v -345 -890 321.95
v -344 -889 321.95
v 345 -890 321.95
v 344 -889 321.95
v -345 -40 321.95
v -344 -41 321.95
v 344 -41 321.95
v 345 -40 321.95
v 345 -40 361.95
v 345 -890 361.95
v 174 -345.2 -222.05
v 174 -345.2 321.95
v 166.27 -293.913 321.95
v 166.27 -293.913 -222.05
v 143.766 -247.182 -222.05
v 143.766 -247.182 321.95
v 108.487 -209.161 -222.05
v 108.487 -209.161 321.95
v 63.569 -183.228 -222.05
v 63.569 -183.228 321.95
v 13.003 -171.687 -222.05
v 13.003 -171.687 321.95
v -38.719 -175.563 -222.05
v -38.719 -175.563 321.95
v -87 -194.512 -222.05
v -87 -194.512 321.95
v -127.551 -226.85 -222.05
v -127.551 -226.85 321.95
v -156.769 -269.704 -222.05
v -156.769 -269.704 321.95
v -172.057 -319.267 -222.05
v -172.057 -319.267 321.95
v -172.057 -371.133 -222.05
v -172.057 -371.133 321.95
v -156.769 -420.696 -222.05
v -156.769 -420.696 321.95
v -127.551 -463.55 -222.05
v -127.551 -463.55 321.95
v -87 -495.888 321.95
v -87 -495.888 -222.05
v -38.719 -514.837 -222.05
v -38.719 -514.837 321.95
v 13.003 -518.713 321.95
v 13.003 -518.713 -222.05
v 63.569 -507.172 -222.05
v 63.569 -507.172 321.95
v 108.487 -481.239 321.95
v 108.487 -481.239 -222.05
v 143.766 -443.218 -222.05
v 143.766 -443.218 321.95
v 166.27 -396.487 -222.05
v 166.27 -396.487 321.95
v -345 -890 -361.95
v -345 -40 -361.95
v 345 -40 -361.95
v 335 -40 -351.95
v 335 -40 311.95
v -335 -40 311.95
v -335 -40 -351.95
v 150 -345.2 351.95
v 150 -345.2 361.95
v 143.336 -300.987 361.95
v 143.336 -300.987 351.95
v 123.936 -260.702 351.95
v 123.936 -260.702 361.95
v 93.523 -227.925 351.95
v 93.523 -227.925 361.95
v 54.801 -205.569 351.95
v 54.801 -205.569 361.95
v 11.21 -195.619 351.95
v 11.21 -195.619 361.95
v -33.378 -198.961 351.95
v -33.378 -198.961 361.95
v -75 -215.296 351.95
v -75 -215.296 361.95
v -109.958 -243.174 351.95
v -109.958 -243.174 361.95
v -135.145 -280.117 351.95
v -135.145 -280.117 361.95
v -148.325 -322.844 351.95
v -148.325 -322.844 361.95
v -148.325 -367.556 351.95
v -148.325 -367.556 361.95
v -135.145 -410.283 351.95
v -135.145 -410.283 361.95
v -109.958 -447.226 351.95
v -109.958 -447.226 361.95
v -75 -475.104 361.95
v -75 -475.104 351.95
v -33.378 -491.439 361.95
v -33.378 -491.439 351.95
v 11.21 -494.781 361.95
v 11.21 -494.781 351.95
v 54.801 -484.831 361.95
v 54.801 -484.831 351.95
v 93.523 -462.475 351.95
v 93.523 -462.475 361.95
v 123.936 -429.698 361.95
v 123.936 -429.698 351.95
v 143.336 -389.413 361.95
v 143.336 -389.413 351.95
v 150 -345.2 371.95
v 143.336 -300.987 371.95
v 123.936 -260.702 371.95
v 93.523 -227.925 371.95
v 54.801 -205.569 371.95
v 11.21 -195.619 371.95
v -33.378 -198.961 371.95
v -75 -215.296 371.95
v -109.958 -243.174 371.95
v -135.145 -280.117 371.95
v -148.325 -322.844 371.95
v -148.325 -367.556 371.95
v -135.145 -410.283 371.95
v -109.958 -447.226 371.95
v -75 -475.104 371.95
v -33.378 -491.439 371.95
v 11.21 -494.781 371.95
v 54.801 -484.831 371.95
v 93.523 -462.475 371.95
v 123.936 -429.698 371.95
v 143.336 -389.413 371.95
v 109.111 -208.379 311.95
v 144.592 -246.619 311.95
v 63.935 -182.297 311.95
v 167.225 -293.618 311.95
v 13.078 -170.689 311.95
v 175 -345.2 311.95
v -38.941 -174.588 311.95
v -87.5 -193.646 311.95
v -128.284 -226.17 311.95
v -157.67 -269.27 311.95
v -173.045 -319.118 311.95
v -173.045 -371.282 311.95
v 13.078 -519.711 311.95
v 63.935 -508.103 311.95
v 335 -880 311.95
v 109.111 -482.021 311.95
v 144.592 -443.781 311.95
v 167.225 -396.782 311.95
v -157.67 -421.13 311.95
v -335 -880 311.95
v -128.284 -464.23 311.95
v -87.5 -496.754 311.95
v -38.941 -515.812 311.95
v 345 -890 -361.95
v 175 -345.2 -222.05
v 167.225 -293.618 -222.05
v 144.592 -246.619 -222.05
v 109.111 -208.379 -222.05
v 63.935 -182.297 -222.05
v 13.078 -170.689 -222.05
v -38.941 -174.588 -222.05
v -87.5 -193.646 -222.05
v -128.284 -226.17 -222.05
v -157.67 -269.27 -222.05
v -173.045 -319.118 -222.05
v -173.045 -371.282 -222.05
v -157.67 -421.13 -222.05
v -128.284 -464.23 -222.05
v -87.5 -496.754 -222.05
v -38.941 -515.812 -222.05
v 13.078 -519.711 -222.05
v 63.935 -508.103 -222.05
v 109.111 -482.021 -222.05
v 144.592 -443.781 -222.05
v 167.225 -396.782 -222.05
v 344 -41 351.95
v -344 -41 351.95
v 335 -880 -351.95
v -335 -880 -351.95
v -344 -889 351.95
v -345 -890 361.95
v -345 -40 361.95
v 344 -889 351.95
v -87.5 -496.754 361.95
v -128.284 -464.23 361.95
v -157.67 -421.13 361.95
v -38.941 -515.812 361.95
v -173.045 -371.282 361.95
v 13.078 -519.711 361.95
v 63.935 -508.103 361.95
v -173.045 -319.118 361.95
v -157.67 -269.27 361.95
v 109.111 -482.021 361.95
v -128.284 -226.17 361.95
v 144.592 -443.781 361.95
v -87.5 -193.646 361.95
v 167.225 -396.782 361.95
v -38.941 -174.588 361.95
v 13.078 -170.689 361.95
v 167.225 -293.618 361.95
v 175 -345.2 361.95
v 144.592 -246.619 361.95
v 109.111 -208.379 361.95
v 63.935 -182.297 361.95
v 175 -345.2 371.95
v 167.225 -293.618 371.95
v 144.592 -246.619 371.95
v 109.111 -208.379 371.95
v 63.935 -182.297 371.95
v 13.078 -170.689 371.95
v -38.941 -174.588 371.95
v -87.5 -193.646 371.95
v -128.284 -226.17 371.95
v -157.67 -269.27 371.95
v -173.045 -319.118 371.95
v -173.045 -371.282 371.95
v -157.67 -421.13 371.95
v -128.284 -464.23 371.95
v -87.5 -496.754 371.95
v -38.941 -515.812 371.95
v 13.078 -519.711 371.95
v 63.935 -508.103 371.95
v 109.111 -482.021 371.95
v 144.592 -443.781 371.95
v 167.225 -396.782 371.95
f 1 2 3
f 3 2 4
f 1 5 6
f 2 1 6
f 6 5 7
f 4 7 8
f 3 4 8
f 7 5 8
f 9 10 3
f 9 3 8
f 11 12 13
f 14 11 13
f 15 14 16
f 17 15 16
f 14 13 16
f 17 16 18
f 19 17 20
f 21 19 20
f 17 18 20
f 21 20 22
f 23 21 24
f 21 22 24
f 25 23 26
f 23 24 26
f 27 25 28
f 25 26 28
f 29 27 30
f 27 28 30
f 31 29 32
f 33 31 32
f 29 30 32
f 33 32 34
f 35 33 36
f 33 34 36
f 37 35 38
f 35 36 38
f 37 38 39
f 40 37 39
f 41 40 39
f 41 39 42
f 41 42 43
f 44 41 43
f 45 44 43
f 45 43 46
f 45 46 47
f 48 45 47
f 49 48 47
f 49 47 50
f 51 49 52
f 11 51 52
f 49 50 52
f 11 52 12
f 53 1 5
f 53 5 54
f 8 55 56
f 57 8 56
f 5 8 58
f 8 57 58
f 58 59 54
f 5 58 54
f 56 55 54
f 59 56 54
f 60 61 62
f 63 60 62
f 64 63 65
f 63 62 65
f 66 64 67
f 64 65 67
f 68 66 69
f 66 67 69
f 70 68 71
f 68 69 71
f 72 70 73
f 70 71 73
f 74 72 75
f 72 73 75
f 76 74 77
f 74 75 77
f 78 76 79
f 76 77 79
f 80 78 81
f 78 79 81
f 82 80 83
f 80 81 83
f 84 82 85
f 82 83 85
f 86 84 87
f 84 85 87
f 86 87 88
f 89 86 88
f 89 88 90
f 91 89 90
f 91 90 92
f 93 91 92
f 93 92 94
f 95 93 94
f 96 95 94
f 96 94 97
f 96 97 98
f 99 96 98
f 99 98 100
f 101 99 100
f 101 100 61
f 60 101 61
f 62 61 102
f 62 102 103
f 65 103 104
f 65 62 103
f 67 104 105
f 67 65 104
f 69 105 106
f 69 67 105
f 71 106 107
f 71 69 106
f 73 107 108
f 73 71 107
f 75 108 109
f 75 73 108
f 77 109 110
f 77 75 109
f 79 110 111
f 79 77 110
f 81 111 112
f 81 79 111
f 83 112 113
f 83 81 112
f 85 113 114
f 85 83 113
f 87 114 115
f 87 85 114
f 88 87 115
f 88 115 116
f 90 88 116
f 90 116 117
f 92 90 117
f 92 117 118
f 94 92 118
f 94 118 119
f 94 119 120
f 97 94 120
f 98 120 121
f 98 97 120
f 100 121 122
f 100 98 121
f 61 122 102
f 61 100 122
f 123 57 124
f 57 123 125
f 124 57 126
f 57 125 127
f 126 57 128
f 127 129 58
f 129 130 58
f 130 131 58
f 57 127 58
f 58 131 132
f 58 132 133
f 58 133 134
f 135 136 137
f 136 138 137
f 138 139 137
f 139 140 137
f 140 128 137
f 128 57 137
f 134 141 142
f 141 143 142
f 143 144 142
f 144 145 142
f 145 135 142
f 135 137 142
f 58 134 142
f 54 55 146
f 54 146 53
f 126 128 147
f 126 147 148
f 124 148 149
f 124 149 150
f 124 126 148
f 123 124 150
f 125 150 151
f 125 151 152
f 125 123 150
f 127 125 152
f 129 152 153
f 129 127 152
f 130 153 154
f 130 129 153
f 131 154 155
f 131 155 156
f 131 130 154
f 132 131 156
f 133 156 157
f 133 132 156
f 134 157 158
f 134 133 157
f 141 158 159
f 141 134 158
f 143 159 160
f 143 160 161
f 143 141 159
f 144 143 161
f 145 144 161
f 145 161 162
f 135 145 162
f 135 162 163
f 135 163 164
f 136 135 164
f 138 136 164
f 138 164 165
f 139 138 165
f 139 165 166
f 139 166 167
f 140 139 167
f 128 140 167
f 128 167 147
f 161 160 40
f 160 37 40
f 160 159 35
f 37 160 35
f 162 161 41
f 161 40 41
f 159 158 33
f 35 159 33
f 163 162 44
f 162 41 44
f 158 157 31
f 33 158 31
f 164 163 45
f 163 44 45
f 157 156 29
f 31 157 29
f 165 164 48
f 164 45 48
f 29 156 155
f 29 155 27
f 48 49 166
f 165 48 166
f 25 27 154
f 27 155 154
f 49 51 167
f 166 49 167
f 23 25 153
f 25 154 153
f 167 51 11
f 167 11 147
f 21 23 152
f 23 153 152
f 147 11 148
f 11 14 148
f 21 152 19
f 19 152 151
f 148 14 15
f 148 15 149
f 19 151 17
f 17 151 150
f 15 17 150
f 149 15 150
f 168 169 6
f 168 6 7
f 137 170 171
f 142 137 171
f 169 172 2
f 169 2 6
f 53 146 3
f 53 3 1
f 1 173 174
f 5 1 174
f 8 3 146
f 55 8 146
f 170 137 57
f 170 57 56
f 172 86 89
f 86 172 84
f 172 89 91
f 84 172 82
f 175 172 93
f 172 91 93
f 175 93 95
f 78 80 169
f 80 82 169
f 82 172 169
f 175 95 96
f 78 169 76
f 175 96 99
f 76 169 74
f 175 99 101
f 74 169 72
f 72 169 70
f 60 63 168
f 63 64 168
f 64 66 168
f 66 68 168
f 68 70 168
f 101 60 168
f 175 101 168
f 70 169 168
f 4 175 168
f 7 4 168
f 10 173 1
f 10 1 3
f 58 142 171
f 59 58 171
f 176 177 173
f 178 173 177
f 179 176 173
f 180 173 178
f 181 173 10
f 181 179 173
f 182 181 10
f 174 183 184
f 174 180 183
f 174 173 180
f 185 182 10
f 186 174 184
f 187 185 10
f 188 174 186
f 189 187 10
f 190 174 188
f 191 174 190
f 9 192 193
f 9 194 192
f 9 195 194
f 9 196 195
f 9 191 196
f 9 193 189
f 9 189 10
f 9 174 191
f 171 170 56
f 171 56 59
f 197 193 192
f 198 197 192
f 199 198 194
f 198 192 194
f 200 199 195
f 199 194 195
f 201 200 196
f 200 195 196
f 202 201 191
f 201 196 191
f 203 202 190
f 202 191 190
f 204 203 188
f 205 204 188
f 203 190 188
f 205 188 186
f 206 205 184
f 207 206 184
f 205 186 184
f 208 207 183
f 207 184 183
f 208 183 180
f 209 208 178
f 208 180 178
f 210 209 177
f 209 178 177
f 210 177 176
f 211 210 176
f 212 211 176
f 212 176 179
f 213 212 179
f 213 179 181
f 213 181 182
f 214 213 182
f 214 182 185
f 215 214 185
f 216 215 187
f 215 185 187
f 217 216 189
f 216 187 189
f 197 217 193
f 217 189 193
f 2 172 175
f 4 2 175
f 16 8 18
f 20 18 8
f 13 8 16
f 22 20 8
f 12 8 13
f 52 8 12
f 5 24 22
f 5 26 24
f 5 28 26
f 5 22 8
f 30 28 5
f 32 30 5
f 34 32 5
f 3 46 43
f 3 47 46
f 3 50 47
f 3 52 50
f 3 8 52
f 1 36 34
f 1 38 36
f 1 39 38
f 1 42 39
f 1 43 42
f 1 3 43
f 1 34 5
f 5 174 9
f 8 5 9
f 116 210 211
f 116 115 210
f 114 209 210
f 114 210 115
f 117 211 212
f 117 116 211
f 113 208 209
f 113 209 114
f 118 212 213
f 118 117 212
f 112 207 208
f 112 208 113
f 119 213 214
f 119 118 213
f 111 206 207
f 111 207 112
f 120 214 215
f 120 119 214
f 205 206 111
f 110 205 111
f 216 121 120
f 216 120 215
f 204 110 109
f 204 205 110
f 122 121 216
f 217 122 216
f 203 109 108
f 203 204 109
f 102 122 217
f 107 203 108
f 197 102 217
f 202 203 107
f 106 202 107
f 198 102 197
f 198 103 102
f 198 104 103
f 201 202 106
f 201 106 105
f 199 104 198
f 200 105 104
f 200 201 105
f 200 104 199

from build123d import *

# Parameters (mm, degrees)
SKETCH2_W           = 690
SKETCH2_H           = 683.9
BOSS_EXTRUDE2_DEPTH = 10
SKETCH3_W           = 690
SKETCH3_H           = 683.9
SKETCH3_W_2         = 670
SKETCH3_H_2         = 663.9
BOSS_EXTRUDE3_DEPTH = 850
SKETCH4_R           = 175
CUT_EXTRUDE7_DEPTH  = 30
SKETCH5_W           = 690
SKETCH5_H           = 850
BOSS_EXTRUDE4_DEPTH = 10
SKETCH7_W           = 690
SKETCH7_H           = 850
SKETCH7_W_2         = 688
SKETCH7_H_2         = 848
BOSS_EXTRUDE5_DEPTH = 40
SKETCH6_R           = 175
SKETCH6_R_2         = 150
BOSS_EXTRUDE6_DEPTH = 10
SKETCH9_R           = 175
SKETCH9_R_2         = 174
BOSS_EXTRUDE8_DEPTH = 544
SKETCH10_R          = 150
CUT_EXTRUDE8_DEPTH  = 50


with BuildPart() as part:
    # Sketch2 → Boss-Extrude2 (new body)
    with BuildSketch(Plane(origin=(0, -890, 0), x_dir=(-1, 0, 0), z_dir=(0, -1, 0))):
        with Locations((0, 20)):
            Rectangle(SKETCH2_W, SKETCH2_H)
    extrude(amount=-BOSS_EXTRUDE2_DEPTH)

    # Sketch3 → Boss-Extrude3 (add)
    with BuildSketch(Plane(origin=(0, -890, 0), x_dir=(-1, 0, 0), z_dir=(0, -1, 0))):
        with Locations((0, 20)):
            Rectangle(SKETCH3_W, SKETCH3_H)
        with Locations((0, 20)):
            Rectangle(SKETCH3_W_2, SKETCH3_H_2, mode=Mode.SUBTRACT)
    extrude(amount=-BOSS_EXTRUDE3_DEPTH)

    # Sketch4 → Cut-Extrude7 (cut)
    with BuildSketch(Plane.XY.offset(321.95)):
        with Locations((0, -345.2)):
            Circle(SKETCH4_R)
    extrude(amount=-CUT_EXTRUDE7_DEPTH, mode=Mode.SUBTRACT)

    # Sketch9 → Boss-Extrude8 (add)
    with BuildSketch(Plane.XY.offset(321.95)):
        with Locations((0, -345.2)):
            Circle(SKETCH9_R)
        with Locations((0, -345.2)):
            Circle(SKETCH9_R_2, mode=Mode.SUBTRACT)
    extrude(amount=-BOSS_EXTRUDE8_DEPTH)


with BuildPart() as body_2:
    # Sketch5 → Boss-Extrude4 (new body)
    with BuildSketch(Plane.XY.offset(361.95)):
        with Locations((0, -465)):
            Rectangle(SKETCH5_W, SKETCH5_H)
    extrude(amount=-BOSS_EXTRUDE4_DEPTH)

    # Sketch7 → Boss-Extrude5 (add)
    with BuildSketch(Plane.XY.offset(361.95)):
        with Locations((0, -465)):
            Rectangle(SKETCH7_W, SKETCH7_H)
        with Locations((0, -465)):
            Rectangle(SKETCH7_W_2, SKETCH7_H_2, mode=Mode.SUBTRACT)
    extrude(amount=-BOSS_EXTRUDE5_DEPTH)

    # Sketch6 → Boss-Extrude6 (add)
    with BuildSketch(Plane.XY.offset(361.95)):
        with Locations((0, -345.2)):
            Circle(SKETCH6_R)
        with Locations((0, -345.2)):
            Circle(SKETCH6_R_2, mode=Mode.SUBTRACT)
    extrude(amount=BOSS_EXTRUDE6_DEPTH)

    # Sketch10 → Cut-Extrude8 (cut)
    with BuildSketch(Plane.XY.offset(361.95)):
        with Locations((0, -345.2)):
            Circle(SKETCH10_R)
    extrude(amount=-CUT_EXTRUDE8_DEPTH, mode=Mode.SUBTRACT)


solid = Compound([part.part, body_2.part])
